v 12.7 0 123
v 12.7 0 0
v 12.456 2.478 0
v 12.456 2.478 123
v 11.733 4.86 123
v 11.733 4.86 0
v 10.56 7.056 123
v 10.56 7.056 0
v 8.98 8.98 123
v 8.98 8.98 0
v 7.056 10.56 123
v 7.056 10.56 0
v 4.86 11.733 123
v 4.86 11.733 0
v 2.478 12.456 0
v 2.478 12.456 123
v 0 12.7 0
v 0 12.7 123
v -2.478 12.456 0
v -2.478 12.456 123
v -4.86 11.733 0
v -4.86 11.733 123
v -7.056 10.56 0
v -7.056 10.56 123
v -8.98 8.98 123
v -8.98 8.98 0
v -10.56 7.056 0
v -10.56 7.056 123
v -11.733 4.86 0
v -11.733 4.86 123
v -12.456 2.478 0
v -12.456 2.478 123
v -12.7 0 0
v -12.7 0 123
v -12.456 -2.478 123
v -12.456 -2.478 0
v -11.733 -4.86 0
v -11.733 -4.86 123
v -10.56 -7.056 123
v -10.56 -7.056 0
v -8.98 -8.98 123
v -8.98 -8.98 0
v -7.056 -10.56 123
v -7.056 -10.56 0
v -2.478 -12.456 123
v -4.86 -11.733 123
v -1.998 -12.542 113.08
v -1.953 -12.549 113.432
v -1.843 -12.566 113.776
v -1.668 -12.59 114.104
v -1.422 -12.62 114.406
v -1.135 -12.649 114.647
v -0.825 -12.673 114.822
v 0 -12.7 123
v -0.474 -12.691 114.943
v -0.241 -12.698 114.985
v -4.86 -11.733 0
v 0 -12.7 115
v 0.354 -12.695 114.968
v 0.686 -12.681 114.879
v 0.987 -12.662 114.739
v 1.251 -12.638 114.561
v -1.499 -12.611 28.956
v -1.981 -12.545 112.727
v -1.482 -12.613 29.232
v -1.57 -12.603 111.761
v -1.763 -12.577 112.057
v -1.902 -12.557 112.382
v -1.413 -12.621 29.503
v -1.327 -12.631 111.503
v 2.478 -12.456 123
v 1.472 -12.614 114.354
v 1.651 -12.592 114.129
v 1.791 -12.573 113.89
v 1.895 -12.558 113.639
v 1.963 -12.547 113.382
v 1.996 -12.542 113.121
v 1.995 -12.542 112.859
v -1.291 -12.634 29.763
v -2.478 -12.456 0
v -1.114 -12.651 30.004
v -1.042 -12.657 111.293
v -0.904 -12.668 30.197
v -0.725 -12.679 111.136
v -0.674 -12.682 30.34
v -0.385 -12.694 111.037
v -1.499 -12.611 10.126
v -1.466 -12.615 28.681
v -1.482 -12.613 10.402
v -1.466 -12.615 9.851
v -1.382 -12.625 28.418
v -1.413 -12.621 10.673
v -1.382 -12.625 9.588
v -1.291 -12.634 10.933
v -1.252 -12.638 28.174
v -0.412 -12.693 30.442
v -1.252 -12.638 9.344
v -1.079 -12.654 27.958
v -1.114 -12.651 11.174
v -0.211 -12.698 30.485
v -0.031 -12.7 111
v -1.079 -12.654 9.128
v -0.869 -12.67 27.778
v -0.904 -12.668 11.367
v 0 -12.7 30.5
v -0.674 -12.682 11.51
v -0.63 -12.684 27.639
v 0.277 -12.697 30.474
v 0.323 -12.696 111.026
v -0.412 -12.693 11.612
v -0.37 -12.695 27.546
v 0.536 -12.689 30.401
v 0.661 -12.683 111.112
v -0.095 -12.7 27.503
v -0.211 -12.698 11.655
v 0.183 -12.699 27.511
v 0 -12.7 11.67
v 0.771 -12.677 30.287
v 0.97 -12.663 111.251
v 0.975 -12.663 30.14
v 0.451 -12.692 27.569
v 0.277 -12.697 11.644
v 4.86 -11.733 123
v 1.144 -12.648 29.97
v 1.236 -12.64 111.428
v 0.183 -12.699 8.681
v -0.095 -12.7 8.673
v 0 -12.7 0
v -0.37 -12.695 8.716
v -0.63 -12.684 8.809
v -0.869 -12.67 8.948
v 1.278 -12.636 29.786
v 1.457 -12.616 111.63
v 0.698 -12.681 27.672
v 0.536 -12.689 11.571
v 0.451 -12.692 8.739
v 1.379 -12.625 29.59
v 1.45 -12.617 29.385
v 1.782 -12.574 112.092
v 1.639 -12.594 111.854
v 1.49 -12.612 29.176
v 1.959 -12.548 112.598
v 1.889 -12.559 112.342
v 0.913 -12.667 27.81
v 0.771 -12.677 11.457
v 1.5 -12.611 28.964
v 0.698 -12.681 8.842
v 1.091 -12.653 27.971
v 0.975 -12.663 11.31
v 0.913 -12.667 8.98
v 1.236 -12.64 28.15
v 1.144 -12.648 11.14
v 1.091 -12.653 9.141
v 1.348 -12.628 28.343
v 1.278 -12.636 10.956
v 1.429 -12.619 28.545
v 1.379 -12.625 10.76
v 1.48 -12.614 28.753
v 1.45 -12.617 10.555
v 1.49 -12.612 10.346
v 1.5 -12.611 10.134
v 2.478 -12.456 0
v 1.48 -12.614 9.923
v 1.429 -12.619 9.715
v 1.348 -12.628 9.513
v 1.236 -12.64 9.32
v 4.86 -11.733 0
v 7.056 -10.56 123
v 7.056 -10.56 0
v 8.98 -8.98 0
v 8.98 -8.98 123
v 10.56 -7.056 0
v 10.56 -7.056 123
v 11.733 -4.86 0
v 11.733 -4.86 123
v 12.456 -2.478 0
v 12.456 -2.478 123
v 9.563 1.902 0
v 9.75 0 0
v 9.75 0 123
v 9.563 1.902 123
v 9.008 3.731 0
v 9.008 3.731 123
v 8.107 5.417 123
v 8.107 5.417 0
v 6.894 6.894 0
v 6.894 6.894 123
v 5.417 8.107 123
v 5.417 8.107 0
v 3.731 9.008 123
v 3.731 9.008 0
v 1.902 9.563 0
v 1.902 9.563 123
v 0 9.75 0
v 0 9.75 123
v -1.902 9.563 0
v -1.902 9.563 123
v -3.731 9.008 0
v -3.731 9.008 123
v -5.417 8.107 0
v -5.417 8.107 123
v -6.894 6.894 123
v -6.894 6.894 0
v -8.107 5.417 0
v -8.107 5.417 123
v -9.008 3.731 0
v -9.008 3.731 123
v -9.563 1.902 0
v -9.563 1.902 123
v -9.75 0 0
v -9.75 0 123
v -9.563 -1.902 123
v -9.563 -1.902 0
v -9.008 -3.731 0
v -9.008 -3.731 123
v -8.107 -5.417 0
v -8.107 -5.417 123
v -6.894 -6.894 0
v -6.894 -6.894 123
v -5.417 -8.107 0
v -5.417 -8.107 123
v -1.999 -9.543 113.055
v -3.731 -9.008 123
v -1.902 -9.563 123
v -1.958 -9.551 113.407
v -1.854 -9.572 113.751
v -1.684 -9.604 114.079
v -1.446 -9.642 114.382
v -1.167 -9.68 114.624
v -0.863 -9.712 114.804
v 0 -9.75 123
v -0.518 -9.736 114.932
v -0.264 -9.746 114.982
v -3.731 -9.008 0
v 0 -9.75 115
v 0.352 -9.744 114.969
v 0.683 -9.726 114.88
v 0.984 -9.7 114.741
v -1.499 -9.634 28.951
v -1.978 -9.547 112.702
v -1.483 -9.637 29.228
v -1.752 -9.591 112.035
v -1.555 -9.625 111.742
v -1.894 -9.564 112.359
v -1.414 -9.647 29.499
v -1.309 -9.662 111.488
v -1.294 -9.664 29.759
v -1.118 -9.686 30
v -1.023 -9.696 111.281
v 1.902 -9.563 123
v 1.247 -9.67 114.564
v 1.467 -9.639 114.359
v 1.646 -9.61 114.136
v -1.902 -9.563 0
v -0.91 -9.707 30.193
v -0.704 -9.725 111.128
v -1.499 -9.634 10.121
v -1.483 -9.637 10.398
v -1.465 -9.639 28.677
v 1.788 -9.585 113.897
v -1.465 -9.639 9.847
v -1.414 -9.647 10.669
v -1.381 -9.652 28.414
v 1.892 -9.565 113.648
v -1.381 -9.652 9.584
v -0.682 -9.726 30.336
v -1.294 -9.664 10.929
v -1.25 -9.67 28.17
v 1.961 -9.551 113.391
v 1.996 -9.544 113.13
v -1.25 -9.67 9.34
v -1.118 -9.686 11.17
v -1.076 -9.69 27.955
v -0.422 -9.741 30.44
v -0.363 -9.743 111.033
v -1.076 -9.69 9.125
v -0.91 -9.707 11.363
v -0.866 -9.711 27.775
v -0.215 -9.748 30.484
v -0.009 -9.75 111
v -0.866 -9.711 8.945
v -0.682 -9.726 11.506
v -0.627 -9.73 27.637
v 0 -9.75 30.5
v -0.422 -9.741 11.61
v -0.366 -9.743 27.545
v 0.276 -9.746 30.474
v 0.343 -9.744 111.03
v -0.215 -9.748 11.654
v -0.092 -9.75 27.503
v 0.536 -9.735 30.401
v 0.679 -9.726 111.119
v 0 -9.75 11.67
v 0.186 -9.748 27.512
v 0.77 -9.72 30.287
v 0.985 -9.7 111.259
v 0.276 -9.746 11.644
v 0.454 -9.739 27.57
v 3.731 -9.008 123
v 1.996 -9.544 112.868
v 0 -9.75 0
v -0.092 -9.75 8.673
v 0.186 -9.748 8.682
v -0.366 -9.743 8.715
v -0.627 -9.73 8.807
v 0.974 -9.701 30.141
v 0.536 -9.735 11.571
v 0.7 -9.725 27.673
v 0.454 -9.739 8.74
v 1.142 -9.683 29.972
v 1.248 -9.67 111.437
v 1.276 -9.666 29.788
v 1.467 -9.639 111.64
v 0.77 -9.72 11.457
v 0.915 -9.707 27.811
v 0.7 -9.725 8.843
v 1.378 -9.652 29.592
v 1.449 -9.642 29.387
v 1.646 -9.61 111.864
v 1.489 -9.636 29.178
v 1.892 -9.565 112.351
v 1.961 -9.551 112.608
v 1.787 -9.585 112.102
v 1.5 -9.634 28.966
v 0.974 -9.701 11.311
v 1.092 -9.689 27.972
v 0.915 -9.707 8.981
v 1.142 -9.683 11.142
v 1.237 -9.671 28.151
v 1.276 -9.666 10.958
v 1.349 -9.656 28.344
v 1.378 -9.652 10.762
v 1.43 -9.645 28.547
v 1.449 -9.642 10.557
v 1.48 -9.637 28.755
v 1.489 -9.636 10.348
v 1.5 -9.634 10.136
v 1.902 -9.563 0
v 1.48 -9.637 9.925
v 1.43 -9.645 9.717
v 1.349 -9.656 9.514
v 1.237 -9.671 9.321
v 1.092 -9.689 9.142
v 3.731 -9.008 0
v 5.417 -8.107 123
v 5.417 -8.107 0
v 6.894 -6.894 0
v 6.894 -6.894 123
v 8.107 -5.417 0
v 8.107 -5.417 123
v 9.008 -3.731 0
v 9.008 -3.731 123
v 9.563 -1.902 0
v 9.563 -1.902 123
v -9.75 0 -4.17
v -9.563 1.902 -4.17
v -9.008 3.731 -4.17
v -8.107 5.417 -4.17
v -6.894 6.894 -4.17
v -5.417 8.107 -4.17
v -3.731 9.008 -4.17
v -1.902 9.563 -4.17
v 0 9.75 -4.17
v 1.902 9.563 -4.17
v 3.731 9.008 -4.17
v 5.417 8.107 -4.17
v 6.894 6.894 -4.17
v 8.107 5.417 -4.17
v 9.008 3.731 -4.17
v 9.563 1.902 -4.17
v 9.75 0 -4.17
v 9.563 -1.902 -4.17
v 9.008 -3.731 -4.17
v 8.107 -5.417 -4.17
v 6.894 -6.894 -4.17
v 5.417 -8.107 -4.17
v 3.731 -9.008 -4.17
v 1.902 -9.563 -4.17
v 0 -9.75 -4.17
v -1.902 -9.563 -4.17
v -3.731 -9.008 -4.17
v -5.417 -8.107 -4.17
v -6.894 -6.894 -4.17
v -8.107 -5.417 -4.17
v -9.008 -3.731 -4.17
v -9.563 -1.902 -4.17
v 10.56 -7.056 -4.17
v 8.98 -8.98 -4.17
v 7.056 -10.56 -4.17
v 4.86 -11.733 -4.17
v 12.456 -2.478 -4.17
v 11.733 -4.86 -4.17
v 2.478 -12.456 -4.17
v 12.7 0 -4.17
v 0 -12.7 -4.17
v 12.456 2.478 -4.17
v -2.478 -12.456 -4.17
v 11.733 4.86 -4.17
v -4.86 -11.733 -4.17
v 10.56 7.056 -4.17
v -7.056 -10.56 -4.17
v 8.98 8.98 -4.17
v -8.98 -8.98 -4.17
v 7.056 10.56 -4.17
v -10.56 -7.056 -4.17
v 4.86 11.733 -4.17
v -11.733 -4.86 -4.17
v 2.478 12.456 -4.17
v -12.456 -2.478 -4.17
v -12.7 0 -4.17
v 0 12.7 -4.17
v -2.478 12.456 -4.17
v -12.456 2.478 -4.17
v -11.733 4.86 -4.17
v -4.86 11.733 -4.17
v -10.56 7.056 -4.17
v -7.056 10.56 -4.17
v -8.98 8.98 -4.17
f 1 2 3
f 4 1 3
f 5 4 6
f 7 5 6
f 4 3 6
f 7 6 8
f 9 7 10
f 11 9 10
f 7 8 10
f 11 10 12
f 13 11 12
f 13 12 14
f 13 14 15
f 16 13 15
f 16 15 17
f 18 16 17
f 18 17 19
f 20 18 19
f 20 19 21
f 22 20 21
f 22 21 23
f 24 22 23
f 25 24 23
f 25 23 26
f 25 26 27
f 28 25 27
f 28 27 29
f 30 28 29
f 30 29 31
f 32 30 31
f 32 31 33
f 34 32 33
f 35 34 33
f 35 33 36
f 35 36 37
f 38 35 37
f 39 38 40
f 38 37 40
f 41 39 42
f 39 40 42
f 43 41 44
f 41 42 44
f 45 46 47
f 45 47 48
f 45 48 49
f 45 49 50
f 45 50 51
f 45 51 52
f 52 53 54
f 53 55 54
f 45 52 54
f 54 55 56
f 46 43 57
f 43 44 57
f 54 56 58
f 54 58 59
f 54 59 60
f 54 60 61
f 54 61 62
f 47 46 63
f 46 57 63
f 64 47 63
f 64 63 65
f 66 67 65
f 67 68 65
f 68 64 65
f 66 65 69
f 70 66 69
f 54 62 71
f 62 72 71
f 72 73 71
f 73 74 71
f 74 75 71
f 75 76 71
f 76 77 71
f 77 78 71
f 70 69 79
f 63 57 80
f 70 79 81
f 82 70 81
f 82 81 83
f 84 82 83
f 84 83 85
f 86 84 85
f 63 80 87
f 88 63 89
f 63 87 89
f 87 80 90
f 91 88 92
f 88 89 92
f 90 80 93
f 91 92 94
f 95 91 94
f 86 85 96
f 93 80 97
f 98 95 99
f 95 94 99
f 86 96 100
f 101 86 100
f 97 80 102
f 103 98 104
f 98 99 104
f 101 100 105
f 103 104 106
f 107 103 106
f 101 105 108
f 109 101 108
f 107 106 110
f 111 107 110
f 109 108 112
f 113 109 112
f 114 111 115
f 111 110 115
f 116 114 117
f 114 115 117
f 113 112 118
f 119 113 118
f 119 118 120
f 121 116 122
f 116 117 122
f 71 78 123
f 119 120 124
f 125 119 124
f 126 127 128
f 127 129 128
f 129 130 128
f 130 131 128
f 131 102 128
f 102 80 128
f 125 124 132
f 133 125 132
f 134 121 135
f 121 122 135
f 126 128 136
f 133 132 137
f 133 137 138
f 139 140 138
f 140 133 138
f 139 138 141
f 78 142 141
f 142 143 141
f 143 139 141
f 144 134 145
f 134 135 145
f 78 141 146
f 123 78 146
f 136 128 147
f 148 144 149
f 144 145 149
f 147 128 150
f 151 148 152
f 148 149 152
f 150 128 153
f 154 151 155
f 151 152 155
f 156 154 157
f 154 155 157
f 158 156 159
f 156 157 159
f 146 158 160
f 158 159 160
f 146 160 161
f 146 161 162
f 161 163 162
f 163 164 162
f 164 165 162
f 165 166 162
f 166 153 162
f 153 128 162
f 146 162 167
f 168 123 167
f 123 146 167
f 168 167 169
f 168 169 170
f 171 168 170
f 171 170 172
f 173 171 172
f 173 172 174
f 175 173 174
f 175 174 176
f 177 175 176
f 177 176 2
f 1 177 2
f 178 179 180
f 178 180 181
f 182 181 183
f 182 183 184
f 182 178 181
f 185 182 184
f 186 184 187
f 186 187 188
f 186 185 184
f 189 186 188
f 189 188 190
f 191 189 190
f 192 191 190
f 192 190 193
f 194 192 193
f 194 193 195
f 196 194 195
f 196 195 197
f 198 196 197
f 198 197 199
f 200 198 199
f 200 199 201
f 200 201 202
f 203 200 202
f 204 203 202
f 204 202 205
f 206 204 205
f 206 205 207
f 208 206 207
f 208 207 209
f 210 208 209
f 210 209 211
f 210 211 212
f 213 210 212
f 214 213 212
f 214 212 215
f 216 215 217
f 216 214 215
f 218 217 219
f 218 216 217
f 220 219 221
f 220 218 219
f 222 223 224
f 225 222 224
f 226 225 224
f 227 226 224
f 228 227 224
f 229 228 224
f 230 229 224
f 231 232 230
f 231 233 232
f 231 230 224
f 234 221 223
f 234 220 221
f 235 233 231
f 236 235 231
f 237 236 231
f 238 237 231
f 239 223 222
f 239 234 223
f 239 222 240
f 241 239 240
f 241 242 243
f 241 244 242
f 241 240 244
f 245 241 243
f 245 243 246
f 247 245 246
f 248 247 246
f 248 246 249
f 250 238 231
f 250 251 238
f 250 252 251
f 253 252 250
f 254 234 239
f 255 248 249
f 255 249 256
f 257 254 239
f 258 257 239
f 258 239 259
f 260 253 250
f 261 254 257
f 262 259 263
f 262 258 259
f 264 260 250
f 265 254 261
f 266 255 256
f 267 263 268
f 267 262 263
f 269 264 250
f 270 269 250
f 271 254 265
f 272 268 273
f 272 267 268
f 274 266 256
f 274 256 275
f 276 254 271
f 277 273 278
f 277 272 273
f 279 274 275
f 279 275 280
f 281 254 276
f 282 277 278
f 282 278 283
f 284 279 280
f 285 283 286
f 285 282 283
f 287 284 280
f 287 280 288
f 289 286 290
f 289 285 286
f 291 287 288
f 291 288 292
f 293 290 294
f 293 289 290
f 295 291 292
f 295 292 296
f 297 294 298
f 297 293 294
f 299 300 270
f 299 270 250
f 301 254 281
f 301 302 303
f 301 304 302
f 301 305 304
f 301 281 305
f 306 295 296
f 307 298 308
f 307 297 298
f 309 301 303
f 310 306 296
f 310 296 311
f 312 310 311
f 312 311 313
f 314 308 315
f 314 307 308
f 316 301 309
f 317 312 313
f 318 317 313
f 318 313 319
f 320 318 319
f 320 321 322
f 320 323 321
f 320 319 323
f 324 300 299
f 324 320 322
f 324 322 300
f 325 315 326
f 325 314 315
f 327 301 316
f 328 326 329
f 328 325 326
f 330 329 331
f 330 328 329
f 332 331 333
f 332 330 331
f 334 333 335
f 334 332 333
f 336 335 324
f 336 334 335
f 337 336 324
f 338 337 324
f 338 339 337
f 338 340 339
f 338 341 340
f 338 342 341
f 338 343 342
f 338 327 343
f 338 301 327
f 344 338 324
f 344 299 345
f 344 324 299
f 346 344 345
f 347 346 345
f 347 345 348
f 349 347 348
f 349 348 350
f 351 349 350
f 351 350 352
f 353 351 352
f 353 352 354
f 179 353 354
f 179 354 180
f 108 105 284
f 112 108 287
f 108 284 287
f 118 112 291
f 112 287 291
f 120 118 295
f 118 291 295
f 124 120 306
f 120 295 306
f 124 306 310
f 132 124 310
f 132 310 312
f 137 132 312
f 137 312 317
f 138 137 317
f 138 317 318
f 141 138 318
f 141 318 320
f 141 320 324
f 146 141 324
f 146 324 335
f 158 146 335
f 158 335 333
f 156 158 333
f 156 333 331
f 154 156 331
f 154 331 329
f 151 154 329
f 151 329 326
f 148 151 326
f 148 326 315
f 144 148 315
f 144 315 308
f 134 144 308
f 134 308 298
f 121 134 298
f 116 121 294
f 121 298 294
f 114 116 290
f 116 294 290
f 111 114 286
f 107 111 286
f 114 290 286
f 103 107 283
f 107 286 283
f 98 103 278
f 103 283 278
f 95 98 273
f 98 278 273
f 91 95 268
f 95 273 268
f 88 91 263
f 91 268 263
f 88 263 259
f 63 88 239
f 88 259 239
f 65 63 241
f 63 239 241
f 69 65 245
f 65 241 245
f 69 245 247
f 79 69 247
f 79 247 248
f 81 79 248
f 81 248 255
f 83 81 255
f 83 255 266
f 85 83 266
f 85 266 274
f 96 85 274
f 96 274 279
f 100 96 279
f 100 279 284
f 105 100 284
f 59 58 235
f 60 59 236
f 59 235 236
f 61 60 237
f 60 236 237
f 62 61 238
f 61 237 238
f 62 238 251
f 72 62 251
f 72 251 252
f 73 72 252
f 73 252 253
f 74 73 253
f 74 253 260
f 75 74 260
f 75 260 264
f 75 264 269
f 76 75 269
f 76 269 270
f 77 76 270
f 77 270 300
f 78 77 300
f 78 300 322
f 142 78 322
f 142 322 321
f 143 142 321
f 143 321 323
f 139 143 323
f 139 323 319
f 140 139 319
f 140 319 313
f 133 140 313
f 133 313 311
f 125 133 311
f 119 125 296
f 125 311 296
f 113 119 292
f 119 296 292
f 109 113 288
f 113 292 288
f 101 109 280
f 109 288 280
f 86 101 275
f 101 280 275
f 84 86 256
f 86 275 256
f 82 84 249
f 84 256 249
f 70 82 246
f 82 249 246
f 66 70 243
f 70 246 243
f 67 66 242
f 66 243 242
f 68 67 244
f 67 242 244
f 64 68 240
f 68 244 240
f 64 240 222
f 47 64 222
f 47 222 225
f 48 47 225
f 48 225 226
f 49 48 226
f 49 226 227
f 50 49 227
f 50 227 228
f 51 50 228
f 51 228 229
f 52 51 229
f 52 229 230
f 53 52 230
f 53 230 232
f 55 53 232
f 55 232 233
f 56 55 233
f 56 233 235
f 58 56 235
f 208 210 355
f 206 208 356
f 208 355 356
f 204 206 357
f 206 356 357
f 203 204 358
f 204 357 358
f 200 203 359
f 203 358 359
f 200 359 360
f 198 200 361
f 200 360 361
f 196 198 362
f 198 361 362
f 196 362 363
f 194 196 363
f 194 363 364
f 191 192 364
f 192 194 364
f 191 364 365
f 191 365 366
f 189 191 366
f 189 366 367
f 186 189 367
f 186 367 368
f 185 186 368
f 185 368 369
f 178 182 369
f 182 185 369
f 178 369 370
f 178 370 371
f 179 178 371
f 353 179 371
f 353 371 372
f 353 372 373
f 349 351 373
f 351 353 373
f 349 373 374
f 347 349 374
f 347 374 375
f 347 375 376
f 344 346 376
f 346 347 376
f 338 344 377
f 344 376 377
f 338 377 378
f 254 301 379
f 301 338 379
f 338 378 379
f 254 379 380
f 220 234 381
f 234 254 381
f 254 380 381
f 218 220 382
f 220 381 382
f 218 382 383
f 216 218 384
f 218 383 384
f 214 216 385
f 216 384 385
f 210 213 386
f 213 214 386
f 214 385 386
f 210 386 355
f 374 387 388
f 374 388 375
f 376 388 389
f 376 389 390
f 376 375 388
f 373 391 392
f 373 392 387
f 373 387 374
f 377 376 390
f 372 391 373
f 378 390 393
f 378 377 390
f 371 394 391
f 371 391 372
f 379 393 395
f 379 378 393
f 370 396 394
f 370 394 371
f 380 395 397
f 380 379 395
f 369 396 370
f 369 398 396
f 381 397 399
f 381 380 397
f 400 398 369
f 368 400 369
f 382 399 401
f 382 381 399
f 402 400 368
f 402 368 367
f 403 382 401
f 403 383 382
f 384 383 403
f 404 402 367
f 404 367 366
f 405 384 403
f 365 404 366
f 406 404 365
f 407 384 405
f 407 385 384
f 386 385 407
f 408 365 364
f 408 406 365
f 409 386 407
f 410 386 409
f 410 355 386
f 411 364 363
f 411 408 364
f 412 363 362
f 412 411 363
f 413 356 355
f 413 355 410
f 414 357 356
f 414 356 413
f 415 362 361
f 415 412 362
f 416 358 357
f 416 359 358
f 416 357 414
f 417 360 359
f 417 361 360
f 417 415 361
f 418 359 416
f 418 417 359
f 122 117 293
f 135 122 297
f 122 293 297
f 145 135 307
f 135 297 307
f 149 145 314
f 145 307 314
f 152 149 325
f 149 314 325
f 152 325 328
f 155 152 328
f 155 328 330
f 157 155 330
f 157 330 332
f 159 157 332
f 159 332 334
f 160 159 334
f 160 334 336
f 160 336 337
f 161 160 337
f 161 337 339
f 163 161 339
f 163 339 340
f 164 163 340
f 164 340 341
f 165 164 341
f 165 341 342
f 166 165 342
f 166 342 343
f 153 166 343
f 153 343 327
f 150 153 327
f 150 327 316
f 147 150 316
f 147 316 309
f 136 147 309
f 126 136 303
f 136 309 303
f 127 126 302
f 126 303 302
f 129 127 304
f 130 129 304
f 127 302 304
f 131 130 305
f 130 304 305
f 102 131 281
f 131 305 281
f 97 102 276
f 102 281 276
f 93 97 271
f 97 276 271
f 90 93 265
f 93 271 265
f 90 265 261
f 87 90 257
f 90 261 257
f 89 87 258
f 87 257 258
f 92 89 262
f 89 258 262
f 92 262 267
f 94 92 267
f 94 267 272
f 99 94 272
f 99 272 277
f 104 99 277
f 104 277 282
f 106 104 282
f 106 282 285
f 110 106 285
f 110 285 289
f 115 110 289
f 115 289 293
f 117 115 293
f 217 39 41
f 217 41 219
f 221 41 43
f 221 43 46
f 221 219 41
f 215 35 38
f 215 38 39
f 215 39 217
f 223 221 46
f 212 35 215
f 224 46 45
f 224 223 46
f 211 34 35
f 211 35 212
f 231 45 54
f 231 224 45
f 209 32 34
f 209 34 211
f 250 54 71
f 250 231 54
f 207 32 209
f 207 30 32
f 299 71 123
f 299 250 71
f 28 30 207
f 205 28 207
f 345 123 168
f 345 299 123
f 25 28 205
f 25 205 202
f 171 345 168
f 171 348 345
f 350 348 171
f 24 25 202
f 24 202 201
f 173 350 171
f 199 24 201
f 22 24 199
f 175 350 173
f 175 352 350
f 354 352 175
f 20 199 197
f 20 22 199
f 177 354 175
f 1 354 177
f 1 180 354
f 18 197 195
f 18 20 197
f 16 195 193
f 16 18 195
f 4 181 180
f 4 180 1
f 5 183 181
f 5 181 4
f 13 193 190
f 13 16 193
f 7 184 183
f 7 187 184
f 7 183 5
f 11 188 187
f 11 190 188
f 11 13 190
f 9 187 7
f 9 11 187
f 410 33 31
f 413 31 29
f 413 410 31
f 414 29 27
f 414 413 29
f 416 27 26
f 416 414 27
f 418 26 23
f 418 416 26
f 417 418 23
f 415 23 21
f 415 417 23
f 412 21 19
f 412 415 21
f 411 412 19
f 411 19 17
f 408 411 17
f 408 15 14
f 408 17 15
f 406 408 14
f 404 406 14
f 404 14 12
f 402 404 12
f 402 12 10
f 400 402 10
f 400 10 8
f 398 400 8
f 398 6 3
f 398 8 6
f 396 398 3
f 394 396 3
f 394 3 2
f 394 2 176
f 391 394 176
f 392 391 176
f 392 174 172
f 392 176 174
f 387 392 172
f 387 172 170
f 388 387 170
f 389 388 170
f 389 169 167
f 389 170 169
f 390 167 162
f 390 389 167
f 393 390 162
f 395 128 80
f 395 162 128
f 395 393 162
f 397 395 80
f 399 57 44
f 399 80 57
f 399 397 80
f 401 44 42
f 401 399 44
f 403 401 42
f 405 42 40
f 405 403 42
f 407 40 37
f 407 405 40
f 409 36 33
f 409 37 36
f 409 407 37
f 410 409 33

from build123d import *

# Parameters (mm, degrees)
SKETCH1_R           = 12.7
SKETCH1_R_2         = 9.75
BOSS_EXTRUDE1_DEPTH = 123
SKETCH7_R           = 1.5
SKETCH7_R_2         = 2
CUT_EXTRUDE1_DEPTH  = 108
BOSS_EXTRUDE2_START = 4.17
SKETCH8_R           = 12.7
SKETCH8_R_2         = 9.75
BOSS_EXTRUDE2_DEPTH = 4.17


with BuildPart() as part:
    # Sketch1 → Boss-Extrude1 (new body)
    with BuildSketch(Plane.XY):
        Circle(SKETCH1_R)
        Circle(SKETCH1_R_2, mode=Mode.SUBTRACT)
    extrude(amount=BOSS_EXTRUDE1_DEPTH)

    # Sketch7 → Cut-Extrude1 (cut)
    with BuildSketch(Plane(origin=(0, 0, 0), x_dir=(1, 0, 0), z_dir=(0, 1, 0))):
        with Locations(Location((0, -10.17, 0), (0, 0, 270))):
            Circle(SKETCH7_R)
        with Locations(Location((0, -29, 0), (0, 0, 270))):
            Circle(SKETCH7_R)
        with Locations(Location((0, -113, 0), (0, 0, 270))):
            Circle(SKETCH7_R_2)
    extrude(amount=-CUT_EXTRUDE1_DEPTH, mode=Mode.SUBTRACT)

    # Sketch8 → Boss-Extrude2 (add)
    with BuildSketch(Plane(origin=(0, 0, 0), x_dir=(-1, 0, 0), z_dir=(0, 0, -1)).offset(BOSS_EXTRUDE2_START)):
        Circle(SKETCH8_R)
        Circle(SKETCH8_R_2, mode=Mode.SUBTRACT)
    extrude(amount=-BOSS_EXTRUDE2_DEPTH)


solid = part.part
